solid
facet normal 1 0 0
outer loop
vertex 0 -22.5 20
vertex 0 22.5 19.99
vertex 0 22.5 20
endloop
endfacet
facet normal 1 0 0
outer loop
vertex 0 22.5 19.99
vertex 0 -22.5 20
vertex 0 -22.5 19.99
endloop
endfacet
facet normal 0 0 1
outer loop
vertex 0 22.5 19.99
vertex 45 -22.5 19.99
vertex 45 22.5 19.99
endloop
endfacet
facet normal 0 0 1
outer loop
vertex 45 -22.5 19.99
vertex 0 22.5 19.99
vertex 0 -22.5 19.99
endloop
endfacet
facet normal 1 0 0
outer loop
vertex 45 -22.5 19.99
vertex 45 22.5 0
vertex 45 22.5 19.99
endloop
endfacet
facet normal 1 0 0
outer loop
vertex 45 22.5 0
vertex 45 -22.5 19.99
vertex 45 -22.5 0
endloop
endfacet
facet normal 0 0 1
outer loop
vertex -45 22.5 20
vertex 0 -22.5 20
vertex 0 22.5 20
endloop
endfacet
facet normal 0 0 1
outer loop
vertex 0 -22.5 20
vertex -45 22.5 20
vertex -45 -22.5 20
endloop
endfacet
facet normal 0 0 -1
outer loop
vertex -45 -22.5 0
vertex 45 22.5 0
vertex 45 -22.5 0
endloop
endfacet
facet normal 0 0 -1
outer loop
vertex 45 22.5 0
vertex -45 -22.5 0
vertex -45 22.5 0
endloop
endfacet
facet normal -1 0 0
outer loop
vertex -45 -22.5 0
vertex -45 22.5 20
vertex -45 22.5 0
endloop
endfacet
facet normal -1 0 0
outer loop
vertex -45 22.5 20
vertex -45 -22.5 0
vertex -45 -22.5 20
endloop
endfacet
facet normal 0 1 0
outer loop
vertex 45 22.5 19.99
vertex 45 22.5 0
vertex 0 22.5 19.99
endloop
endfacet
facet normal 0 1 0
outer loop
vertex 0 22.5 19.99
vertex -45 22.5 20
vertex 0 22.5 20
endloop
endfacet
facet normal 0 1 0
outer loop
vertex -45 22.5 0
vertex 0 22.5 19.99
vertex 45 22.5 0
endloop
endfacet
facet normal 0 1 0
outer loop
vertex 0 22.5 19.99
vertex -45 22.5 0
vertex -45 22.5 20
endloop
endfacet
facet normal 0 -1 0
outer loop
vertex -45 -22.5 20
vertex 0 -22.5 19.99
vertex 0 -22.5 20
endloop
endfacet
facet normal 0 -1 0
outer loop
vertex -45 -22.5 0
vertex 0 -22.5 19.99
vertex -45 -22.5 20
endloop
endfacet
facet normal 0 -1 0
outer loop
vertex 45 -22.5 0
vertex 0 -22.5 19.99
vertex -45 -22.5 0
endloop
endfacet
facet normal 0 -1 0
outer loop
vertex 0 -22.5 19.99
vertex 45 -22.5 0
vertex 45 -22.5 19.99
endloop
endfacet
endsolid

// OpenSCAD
// Drying rack for microscope slides - a solid base block with a row of parallel slots cut near
// the top, open at the top so wet slides standing on their long edge drain by capillary action.
// NOVEL general part (a generic "slide dryer" could apply to many labs).
//

slides_l = 75;
slides_w = 25;
slides_t = 1;
base_l   = 90;
base_w   = 45;
base_h   = 20;
slot_l   = 77;
slot_w   = 1.6;
slot_d   = 10;
pitch    = 3.5;

$fn = 48;

slot_h = base_h - slot_d + 0.01;                 // so the slot face is just below the top face

difference() {
    translate([-base_l / 2, -base_w / 2, 0]) cube([base_l, base_w, base_h]);
    for (y = [-base_w / 2 - pitch / 2 : pitch : base_w / 2 + pitch / 2])
        translate([0, y, 0])
            difference() {
                translate([0, 0, base_h - slot_d + 0.01]) cube([slot_l, base_w, slot_d]);   // upper wall of the slot
                translate([0, 0, base_h - slot_d]) cube([slot_l, base_w, slot_d - 0.01]);   // floor of the slot
            }
}
